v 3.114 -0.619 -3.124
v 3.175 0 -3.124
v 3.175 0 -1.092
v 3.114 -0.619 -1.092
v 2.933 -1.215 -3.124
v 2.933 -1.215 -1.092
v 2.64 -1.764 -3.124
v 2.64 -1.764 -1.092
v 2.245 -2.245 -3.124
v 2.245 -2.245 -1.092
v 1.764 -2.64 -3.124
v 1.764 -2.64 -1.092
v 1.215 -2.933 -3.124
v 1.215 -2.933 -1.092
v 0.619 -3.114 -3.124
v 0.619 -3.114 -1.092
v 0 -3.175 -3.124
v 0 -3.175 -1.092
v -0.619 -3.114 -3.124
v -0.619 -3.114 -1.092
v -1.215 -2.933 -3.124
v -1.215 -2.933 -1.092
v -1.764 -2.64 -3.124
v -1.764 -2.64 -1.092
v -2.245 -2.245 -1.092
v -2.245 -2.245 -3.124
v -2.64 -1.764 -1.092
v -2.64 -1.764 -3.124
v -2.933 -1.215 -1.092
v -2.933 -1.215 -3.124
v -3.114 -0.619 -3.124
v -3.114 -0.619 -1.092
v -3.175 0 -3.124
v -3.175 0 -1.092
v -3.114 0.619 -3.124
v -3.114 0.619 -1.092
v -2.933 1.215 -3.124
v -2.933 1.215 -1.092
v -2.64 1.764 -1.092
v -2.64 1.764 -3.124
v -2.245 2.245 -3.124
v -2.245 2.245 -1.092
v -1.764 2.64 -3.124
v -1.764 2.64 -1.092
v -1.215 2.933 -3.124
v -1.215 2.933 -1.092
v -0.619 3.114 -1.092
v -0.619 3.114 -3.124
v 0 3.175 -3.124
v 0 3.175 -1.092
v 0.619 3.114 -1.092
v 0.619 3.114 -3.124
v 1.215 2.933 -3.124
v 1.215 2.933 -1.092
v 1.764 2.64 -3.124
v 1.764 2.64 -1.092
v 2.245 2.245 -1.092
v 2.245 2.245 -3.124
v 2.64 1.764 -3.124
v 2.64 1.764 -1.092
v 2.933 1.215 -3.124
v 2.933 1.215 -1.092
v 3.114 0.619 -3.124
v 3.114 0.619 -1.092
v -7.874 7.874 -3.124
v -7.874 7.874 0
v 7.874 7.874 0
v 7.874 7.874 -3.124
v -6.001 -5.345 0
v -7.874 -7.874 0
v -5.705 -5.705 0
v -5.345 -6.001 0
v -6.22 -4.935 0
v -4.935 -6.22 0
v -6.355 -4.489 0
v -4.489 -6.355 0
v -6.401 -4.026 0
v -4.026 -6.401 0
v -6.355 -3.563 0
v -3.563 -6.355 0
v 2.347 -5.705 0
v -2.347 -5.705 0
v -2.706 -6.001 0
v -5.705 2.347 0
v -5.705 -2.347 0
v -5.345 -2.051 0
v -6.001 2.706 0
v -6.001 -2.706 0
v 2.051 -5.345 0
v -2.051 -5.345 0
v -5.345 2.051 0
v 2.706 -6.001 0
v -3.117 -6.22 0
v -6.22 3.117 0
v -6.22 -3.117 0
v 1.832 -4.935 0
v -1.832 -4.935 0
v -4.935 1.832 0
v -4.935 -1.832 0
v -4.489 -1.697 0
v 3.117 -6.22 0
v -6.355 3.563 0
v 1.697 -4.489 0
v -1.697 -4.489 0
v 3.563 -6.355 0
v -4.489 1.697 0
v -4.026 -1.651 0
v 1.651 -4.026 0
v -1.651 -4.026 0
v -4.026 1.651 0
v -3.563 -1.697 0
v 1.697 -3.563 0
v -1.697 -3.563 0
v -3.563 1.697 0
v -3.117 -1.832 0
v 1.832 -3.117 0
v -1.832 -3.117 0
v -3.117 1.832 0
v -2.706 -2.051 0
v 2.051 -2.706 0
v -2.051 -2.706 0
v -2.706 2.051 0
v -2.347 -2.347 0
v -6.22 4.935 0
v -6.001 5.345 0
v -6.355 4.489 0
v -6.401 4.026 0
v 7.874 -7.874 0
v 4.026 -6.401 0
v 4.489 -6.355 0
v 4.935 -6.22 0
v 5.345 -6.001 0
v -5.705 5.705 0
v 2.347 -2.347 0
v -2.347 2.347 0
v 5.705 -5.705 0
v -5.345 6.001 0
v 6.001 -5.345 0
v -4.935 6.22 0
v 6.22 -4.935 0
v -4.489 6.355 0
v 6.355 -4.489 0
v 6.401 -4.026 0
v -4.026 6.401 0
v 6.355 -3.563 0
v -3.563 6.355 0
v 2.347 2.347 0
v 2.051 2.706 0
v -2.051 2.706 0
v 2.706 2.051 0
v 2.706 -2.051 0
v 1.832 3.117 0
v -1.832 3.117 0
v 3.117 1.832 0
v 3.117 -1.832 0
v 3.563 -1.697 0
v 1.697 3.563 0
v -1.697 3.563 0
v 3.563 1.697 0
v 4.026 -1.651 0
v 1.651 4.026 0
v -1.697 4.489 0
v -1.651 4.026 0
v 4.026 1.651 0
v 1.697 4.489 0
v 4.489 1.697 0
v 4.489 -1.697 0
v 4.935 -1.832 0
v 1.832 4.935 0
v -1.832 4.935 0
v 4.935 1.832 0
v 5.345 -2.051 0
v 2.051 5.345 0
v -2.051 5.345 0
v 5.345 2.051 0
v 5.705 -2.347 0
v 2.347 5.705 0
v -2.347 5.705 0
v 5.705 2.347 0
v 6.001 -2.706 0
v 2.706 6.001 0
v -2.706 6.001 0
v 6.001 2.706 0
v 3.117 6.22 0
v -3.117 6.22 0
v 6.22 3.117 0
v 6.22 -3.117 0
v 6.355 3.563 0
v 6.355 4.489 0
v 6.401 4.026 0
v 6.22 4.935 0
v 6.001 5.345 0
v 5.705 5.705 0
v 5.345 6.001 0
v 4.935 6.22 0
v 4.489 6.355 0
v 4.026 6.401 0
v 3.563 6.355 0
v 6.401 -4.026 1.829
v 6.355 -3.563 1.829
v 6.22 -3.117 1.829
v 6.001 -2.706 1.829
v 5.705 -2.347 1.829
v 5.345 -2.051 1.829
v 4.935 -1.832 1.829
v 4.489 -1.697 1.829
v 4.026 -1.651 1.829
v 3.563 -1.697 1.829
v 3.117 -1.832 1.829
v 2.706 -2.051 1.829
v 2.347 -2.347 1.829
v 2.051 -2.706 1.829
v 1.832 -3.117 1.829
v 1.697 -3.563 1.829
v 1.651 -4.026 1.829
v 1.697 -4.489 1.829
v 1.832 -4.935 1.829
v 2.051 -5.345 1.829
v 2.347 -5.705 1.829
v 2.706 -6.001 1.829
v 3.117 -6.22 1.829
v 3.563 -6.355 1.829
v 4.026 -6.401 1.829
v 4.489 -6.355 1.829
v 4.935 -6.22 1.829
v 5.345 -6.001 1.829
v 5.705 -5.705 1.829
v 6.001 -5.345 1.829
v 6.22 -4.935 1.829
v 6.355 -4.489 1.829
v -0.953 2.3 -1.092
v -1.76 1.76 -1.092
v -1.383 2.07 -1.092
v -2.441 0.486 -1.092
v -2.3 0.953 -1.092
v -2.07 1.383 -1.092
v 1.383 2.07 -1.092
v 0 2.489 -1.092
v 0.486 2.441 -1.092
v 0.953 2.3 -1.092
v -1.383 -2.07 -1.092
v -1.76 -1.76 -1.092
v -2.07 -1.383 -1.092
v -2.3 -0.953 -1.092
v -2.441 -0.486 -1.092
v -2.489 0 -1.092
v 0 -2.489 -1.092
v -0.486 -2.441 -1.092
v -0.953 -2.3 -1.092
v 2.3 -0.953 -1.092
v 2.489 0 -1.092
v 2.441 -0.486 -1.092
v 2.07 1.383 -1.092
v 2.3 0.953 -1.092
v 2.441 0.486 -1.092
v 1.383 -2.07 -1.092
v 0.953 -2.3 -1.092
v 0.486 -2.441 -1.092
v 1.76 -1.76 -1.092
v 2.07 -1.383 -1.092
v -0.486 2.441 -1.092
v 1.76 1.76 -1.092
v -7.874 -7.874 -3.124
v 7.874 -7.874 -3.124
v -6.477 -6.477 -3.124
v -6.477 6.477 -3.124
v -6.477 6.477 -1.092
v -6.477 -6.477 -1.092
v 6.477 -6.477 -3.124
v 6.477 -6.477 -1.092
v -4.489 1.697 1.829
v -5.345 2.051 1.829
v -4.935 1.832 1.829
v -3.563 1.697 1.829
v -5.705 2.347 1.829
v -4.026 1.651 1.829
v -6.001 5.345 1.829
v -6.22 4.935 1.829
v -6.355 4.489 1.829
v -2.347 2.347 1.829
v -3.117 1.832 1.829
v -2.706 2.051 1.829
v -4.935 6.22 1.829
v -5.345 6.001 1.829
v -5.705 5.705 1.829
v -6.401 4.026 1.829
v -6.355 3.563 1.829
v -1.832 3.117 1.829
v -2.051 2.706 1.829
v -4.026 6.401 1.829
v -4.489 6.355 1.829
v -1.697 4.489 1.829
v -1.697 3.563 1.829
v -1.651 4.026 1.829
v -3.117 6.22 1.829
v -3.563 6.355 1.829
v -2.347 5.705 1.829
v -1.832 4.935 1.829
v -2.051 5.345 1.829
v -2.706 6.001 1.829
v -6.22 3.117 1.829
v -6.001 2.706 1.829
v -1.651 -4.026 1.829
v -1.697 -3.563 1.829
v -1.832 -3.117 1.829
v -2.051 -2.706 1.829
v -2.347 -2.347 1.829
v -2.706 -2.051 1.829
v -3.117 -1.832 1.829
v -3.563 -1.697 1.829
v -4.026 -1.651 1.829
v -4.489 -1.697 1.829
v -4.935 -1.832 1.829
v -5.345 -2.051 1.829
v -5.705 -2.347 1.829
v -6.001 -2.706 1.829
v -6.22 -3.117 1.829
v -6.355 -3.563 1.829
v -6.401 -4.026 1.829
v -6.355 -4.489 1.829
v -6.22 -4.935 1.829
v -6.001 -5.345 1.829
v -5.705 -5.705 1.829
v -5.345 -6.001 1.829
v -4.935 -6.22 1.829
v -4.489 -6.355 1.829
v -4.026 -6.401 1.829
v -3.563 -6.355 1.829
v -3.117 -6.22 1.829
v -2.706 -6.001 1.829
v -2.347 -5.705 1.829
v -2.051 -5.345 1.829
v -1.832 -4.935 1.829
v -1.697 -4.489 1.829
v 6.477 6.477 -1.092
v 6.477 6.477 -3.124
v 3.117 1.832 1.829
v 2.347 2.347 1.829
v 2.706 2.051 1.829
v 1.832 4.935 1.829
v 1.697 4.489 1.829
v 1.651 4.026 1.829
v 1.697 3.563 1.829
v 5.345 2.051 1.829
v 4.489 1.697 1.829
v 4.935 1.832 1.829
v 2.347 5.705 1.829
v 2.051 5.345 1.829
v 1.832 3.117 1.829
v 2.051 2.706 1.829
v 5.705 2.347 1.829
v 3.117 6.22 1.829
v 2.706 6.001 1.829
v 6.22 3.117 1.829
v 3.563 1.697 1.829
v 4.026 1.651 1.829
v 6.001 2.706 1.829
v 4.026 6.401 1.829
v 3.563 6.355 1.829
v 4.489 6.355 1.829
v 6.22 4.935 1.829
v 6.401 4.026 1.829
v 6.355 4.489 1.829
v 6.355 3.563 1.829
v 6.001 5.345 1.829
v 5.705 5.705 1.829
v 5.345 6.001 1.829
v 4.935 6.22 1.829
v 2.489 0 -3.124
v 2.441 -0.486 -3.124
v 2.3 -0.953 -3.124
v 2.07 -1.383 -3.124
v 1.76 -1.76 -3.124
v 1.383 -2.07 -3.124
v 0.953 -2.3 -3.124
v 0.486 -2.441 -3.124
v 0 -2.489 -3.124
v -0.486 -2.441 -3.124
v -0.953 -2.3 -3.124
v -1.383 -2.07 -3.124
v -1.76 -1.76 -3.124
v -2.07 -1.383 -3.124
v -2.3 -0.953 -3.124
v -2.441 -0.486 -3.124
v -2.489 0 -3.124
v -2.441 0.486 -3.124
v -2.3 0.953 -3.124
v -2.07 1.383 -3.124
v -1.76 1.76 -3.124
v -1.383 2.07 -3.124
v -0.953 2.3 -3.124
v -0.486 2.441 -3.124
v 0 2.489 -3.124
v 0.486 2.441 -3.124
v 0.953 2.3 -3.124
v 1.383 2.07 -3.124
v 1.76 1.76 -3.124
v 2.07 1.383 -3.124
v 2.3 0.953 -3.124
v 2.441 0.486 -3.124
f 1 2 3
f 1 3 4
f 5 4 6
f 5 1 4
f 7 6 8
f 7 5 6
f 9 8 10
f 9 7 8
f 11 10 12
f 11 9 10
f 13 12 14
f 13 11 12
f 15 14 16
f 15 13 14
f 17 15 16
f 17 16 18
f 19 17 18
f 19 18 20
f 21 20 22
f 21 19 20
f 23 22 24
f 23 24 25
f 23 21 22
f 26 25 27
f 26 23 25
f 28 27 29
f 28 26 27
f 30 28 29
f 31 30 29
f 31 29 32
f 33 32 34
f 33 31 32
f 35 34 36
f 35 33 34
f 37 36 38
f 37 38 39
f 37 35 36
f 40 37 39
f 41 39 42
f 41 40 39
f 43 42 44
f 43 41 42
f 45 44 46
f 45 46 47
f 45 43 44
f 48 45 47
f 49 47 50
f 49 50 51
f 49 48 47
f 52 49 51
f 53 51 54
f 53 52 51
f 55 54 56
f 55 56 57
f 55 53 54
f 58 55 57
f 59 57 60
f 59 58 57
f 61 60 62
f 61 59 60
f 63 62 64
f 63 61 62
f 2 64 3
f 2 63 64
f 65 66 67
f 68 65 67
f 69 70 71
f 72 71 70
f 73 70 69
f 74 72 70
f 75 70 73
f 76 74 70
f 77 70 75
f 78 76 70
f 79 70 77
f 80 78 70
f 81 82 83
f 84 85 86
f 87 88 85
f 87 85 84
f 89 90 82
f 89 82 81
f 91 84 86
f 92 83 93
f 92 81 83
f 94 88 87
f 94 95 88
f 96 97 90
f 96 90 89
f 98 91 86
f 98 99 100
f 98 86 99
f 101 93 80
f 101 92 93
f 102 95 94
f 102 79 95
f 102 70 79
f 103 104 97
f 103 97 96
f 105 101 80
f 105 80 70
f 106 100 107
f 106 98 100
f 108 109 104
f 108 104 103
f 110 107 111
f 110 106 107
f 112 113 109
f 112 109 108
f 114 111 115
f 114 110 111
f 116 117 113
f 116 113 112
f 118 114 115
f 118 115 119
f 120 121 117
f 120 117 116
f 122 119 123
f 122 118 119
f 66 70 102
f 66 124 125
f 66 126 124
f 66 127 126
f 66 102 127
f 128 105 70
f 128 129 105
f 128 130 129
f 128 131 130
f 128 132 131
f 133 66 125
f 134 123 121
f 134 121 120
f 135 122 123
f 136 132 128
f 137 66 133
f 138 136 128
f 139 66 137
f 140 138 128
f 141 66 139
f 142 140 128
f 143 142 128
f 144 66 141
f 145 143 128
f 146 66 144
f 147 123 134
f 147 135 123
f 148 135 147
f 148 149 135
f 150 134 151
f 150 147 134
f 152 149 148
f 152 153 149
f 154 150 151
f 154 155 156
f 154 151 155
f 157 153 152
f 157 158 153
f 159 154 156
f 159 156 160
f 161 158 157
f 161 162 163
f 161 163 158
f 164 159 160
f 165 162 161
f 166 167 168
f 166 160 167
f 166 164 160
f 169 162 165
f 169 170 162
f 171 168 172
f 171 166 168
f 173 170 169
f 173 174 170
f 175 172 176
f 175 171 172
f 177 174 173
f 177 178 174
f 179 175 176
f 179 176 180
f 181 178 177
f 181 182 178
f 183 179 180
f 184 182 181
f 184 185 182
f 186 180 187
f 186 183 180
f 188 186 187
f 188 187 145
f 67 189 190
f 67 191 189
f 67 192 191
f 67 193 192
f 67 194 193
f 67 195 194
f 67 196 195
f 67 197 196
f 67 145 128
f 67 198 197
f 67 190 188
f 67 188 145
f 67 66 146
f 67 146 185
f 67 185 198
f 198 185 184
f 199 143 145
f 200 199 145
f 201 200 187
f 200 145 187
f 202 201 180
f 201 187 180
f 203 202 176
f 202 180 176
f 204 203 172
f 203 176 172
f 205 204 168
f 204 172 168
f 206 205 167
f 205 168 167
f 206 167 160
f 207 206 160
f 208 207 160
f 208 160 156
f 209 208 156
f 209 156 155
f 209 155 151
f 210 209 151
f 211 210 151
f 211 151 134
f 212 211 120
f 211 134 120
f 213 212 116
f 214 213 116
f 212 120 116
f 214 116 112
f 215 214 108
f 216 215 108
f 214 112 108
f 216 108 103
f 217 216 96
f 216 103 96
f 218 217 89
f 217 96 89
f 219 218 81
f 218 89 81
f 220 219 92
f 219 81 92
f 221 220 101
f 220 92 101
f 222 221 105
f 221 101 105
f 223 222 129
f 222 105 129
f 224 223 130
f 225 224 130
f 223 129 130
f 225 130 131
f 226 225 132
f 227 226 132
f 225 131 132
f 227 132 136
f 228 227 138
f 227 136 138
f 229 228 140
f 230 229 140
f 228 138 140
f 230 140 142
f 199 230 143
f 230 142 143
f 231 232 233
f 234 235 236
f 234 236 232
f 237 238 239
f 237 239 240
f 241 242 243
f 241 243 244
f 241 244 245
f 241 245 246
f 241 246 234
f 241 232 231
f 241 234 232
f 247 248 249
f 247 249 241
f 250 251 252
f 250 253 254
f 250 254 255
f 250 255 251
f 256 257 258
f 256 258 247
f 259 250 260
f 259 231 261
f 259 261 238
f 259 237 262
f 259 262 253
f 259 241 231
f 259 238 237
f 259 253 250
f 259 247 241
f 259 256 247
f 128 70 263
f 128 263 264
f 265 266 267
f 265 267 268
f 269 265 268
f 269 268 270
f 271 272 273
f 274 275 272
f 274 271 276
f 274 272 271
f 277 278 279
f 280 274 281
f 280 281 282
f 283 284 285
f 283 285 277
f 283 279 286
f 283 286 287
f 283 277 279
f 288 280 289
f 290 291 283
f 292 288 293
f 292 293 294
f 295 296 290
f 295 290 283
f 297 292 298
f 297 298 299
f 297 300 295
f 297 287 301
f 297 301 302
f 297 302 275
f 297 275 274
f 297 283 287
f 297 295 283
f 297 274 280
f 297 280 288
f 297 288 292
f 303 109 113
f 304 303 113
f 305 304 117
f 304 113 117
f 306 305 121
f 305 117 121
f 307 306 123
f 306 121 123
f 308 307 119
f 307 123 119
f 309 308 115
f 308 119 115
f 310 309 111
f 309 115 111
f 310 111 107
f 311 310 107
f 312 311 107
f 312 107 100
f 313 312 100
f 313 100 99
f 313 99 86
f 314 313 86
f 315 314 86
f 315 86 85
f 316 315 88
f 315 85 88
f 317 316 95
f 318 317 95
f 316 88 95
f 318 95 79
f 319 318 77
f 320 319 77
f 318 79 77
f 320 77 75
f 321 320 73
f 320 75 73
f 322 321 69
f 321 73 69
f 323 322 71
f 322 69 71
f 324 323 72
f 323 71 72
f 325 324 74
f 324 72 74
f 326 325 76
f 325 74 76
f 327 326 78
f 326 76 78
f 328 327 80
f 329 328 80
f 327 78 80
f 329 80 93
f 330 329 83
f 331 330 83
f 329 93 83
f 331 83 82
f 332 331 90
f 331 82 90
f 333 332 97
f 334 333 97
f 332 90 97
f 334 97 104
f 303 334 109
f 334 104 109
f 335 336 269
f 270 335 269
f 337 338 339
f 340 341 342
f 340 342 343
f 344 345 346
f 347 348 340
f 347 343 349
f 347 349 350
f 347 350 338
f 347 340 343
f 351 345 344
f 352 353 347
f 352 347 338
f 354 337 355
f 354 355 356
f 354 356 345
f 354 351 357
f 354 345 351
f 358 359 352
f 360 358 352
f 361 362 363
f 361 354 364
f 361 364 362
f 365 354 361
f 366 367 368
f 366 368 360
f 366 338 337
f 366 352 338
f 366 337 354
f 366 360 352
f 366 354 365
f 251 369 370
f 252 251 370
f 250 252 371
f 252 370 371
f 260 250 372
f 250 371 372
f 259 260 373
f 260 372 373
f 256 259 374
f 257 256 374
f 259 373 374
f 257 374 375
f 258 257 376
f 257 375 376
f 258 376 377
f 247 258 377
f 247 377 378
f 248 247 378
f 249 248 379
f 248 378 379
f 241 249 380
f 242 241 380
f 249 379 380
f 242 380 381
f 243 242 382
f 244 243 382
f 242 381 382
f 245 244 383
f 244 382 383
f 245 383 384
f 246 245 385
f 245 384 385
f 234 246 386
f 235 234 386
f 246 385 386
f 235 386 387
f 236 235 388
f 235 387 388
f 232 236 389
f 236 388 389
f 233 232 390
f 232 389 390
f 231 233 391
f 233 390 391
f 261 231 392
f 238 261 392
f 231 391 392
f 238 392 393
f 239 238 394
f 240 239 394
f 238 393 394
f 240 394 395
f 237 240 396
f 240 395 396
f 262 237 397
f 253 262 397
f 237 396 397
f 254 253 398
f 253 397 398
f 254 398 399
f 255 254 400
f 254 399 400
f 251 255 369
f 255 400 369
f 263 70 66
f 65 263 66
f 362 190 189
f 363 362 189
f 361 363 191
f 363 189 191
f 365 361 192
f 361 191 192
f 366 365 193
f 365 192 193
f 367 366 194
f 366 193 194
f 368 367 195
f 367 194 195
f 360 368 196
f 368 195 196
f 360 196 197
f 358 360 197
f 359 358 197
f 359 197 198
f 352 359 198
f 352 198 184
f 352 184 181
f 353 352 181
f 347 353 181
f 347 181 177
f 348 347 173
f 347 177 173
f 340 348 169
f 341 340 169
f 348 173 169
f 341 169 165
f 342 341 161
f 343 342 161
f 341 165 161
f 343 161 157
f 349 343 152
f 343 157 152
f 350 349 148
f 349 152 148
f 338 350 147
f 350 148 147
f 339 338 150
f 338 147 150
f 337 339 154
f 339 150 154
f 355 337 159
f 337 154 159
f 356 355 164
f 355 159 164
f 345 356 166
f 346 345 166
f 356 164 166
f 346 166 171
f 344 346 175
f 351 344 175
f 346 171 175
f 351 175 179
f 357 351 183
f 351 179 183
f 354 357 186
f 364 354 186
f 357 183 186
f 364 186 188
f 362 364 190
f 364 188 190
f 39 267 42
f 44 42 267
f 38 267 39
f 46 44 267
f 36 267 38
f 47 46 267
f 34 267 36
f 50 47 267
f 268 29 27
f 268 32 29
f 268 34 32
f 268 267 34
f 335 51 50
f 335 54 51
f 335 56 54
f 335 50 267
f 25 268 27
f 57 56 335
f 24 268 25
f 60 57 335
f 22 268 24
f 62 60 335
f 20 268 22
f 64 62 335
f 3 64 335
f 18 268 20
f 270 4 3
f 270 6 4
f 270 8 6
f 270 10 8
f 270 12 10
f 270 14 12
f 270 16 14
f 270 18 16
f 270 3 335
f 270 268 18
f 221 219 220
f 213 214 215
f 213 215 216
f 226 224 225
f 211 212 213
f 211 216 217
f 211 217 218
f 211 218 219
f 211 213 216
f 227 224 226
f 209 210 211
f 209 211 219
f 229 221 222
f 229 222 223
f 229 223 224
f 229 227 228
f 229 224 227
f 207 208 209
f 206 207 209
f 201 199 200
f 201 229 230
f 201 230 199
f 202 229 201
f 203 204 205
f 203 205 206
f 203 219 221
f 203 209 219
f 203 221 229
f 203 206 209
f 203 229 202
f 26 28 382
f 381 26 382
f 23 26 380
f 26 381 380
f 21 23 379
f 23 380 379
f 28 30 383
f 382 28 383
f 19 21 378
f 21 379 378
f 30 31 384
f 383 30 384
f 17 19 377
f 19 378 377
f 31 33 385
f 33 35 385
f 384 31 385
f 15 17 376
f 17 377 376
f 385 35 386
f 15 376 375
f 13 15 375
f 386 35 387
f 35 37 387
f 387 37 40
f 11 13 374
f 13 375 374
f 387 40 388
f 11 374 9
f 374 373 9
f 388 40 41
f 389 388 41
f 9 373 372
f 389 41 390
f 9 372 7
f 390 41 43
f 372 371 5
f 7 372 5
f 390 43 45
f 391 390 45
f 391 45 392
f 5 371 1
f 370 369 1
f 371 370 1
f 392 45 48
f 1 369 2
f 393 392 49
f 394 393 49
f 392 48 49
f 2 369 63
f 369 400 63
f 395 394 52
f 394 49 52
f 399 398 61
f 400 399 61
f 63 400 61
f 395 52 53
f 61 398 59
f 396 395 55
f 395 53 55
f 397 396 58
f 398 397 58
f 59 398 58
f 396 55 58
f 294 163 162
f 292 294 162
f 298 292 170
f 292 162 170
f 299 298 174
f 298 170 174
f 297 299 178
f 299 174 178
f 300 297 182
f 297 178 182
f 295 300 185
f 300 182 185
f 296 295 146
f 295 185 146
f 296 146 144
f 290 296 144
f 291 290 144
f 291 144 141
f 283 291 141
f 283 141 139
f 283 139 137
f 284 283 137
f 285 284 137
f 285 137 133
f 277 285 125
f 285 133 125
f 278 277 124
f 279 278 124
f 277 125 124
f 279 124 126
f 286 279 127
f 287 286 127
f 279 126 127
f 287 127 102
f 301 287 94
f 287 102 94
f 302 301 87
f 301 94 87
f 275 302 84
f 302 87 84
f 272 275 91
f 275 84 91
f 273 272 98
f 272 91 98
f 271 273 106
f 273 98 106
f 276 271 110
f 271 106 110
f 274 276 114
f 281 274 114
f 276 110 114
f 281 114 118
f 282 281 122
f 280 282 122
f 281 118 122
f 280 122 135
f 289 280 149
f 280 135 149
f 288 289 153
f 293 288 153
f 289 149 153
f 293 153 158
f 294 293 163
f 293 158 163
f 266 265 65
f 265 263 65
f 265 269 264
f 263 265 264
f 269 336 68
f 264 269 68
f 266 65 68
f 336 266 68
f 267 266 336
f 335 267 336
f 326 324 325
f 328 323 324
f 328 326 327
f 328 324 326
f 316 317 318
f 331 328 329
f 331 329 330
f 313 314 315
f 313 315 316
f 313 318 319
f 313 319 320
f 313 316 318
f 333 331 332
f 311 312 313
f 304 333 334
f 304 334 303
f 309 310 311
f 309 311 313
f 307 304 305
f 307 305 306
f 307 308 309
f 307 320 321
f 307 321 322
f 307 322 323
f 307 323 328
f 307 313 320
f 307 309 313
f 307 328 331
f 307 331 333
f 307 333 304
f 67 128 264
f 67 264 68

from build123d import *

# Parameters (mm, degrees)
F0_W     = 15.748
F0_H     = 15.748
F0_R     = 2.3749
F1_DEPTH = 3.1242
F2_DEPTH = 1.8288
F3_W     = 12.954
F3_H     = 12.954
F3_R     = 3.175
F4_DEPTH = 2.032
F3_R_2   = 2.4892
F5_DEPTH = 2.032


with BuildPart() as f1:
    # F0 (on Top) → F1 (new body)
    with BuildSketch(Plane.XY):
        Rectangle(F0_W, F0_H)
        with Locations((-4.0259, -4.0259)):
            Circle(F0_R, mode=Mode.SUBTRACT)
        with Locations((4.0259, -4.0259)):
            Circle(F0_R, mode=Mode.SUBTRACT)
        with Locations((-4.0259, 4.0259)):
            Circle(F0_R, mode=Mode.SUBTRACT)
        with Locations((4.0259, 4.0259)):
            Circle(F0_R, mode=Mode.SUBTRACT)
        with Locations((-4.0259, 4.0259)):
            Circle(F0_R)
        with Locations((-4.0259, -4.0259)):
            Circle(F0_R)
        with Locations((4.0259, -4.0259)):
            Circle(F0_R)
        with Locations((4.0259, 4.0259)):
            Circle(F0_R)
    extrude(amount=-F1_DEPTH)

    # F0 (on Top) → F2 (join)
    with BuildSketch(Plane.XY):
        with Locations((-4.0259, 4.0259)):
            Circle(F0_R)
        with Locations((-4.0259, -4.0259)):
            Circle(F0_R)
        with Locations((4.0259, -4.0259)):
            Circle(F0_R)
        with Locations((4.0259, 4.0259)):
            Circle(F0_R)
    extrude(amount=F2_DEPTH)

    # F3 (on face) → F4 (cut)
    with BuildSketch(Plane(origin=(0, 0, -3.1242), x_dir=(1, 0, 0), z_dir=(0, 0, -1))):
        Rectangle(F3_W, F3_H)
        Circle(F3_R, mode=Mode.SUBTRACT)
    extrude(amount=-F4_DEPTH, mode=Mode.SUBTRACT)

    # F3 (on face) → F5 (cut)
    with BuildSketch(Plane(origin=(0, 0, -3.1242), x_dir=(1, 0, 0), z_dir=(0, 0, -1))):
        Circle(F3_R_2)
    extrude(amount=-F5_DEPTH, mode=Mode.SUBTRACT)


solid = f1.part
